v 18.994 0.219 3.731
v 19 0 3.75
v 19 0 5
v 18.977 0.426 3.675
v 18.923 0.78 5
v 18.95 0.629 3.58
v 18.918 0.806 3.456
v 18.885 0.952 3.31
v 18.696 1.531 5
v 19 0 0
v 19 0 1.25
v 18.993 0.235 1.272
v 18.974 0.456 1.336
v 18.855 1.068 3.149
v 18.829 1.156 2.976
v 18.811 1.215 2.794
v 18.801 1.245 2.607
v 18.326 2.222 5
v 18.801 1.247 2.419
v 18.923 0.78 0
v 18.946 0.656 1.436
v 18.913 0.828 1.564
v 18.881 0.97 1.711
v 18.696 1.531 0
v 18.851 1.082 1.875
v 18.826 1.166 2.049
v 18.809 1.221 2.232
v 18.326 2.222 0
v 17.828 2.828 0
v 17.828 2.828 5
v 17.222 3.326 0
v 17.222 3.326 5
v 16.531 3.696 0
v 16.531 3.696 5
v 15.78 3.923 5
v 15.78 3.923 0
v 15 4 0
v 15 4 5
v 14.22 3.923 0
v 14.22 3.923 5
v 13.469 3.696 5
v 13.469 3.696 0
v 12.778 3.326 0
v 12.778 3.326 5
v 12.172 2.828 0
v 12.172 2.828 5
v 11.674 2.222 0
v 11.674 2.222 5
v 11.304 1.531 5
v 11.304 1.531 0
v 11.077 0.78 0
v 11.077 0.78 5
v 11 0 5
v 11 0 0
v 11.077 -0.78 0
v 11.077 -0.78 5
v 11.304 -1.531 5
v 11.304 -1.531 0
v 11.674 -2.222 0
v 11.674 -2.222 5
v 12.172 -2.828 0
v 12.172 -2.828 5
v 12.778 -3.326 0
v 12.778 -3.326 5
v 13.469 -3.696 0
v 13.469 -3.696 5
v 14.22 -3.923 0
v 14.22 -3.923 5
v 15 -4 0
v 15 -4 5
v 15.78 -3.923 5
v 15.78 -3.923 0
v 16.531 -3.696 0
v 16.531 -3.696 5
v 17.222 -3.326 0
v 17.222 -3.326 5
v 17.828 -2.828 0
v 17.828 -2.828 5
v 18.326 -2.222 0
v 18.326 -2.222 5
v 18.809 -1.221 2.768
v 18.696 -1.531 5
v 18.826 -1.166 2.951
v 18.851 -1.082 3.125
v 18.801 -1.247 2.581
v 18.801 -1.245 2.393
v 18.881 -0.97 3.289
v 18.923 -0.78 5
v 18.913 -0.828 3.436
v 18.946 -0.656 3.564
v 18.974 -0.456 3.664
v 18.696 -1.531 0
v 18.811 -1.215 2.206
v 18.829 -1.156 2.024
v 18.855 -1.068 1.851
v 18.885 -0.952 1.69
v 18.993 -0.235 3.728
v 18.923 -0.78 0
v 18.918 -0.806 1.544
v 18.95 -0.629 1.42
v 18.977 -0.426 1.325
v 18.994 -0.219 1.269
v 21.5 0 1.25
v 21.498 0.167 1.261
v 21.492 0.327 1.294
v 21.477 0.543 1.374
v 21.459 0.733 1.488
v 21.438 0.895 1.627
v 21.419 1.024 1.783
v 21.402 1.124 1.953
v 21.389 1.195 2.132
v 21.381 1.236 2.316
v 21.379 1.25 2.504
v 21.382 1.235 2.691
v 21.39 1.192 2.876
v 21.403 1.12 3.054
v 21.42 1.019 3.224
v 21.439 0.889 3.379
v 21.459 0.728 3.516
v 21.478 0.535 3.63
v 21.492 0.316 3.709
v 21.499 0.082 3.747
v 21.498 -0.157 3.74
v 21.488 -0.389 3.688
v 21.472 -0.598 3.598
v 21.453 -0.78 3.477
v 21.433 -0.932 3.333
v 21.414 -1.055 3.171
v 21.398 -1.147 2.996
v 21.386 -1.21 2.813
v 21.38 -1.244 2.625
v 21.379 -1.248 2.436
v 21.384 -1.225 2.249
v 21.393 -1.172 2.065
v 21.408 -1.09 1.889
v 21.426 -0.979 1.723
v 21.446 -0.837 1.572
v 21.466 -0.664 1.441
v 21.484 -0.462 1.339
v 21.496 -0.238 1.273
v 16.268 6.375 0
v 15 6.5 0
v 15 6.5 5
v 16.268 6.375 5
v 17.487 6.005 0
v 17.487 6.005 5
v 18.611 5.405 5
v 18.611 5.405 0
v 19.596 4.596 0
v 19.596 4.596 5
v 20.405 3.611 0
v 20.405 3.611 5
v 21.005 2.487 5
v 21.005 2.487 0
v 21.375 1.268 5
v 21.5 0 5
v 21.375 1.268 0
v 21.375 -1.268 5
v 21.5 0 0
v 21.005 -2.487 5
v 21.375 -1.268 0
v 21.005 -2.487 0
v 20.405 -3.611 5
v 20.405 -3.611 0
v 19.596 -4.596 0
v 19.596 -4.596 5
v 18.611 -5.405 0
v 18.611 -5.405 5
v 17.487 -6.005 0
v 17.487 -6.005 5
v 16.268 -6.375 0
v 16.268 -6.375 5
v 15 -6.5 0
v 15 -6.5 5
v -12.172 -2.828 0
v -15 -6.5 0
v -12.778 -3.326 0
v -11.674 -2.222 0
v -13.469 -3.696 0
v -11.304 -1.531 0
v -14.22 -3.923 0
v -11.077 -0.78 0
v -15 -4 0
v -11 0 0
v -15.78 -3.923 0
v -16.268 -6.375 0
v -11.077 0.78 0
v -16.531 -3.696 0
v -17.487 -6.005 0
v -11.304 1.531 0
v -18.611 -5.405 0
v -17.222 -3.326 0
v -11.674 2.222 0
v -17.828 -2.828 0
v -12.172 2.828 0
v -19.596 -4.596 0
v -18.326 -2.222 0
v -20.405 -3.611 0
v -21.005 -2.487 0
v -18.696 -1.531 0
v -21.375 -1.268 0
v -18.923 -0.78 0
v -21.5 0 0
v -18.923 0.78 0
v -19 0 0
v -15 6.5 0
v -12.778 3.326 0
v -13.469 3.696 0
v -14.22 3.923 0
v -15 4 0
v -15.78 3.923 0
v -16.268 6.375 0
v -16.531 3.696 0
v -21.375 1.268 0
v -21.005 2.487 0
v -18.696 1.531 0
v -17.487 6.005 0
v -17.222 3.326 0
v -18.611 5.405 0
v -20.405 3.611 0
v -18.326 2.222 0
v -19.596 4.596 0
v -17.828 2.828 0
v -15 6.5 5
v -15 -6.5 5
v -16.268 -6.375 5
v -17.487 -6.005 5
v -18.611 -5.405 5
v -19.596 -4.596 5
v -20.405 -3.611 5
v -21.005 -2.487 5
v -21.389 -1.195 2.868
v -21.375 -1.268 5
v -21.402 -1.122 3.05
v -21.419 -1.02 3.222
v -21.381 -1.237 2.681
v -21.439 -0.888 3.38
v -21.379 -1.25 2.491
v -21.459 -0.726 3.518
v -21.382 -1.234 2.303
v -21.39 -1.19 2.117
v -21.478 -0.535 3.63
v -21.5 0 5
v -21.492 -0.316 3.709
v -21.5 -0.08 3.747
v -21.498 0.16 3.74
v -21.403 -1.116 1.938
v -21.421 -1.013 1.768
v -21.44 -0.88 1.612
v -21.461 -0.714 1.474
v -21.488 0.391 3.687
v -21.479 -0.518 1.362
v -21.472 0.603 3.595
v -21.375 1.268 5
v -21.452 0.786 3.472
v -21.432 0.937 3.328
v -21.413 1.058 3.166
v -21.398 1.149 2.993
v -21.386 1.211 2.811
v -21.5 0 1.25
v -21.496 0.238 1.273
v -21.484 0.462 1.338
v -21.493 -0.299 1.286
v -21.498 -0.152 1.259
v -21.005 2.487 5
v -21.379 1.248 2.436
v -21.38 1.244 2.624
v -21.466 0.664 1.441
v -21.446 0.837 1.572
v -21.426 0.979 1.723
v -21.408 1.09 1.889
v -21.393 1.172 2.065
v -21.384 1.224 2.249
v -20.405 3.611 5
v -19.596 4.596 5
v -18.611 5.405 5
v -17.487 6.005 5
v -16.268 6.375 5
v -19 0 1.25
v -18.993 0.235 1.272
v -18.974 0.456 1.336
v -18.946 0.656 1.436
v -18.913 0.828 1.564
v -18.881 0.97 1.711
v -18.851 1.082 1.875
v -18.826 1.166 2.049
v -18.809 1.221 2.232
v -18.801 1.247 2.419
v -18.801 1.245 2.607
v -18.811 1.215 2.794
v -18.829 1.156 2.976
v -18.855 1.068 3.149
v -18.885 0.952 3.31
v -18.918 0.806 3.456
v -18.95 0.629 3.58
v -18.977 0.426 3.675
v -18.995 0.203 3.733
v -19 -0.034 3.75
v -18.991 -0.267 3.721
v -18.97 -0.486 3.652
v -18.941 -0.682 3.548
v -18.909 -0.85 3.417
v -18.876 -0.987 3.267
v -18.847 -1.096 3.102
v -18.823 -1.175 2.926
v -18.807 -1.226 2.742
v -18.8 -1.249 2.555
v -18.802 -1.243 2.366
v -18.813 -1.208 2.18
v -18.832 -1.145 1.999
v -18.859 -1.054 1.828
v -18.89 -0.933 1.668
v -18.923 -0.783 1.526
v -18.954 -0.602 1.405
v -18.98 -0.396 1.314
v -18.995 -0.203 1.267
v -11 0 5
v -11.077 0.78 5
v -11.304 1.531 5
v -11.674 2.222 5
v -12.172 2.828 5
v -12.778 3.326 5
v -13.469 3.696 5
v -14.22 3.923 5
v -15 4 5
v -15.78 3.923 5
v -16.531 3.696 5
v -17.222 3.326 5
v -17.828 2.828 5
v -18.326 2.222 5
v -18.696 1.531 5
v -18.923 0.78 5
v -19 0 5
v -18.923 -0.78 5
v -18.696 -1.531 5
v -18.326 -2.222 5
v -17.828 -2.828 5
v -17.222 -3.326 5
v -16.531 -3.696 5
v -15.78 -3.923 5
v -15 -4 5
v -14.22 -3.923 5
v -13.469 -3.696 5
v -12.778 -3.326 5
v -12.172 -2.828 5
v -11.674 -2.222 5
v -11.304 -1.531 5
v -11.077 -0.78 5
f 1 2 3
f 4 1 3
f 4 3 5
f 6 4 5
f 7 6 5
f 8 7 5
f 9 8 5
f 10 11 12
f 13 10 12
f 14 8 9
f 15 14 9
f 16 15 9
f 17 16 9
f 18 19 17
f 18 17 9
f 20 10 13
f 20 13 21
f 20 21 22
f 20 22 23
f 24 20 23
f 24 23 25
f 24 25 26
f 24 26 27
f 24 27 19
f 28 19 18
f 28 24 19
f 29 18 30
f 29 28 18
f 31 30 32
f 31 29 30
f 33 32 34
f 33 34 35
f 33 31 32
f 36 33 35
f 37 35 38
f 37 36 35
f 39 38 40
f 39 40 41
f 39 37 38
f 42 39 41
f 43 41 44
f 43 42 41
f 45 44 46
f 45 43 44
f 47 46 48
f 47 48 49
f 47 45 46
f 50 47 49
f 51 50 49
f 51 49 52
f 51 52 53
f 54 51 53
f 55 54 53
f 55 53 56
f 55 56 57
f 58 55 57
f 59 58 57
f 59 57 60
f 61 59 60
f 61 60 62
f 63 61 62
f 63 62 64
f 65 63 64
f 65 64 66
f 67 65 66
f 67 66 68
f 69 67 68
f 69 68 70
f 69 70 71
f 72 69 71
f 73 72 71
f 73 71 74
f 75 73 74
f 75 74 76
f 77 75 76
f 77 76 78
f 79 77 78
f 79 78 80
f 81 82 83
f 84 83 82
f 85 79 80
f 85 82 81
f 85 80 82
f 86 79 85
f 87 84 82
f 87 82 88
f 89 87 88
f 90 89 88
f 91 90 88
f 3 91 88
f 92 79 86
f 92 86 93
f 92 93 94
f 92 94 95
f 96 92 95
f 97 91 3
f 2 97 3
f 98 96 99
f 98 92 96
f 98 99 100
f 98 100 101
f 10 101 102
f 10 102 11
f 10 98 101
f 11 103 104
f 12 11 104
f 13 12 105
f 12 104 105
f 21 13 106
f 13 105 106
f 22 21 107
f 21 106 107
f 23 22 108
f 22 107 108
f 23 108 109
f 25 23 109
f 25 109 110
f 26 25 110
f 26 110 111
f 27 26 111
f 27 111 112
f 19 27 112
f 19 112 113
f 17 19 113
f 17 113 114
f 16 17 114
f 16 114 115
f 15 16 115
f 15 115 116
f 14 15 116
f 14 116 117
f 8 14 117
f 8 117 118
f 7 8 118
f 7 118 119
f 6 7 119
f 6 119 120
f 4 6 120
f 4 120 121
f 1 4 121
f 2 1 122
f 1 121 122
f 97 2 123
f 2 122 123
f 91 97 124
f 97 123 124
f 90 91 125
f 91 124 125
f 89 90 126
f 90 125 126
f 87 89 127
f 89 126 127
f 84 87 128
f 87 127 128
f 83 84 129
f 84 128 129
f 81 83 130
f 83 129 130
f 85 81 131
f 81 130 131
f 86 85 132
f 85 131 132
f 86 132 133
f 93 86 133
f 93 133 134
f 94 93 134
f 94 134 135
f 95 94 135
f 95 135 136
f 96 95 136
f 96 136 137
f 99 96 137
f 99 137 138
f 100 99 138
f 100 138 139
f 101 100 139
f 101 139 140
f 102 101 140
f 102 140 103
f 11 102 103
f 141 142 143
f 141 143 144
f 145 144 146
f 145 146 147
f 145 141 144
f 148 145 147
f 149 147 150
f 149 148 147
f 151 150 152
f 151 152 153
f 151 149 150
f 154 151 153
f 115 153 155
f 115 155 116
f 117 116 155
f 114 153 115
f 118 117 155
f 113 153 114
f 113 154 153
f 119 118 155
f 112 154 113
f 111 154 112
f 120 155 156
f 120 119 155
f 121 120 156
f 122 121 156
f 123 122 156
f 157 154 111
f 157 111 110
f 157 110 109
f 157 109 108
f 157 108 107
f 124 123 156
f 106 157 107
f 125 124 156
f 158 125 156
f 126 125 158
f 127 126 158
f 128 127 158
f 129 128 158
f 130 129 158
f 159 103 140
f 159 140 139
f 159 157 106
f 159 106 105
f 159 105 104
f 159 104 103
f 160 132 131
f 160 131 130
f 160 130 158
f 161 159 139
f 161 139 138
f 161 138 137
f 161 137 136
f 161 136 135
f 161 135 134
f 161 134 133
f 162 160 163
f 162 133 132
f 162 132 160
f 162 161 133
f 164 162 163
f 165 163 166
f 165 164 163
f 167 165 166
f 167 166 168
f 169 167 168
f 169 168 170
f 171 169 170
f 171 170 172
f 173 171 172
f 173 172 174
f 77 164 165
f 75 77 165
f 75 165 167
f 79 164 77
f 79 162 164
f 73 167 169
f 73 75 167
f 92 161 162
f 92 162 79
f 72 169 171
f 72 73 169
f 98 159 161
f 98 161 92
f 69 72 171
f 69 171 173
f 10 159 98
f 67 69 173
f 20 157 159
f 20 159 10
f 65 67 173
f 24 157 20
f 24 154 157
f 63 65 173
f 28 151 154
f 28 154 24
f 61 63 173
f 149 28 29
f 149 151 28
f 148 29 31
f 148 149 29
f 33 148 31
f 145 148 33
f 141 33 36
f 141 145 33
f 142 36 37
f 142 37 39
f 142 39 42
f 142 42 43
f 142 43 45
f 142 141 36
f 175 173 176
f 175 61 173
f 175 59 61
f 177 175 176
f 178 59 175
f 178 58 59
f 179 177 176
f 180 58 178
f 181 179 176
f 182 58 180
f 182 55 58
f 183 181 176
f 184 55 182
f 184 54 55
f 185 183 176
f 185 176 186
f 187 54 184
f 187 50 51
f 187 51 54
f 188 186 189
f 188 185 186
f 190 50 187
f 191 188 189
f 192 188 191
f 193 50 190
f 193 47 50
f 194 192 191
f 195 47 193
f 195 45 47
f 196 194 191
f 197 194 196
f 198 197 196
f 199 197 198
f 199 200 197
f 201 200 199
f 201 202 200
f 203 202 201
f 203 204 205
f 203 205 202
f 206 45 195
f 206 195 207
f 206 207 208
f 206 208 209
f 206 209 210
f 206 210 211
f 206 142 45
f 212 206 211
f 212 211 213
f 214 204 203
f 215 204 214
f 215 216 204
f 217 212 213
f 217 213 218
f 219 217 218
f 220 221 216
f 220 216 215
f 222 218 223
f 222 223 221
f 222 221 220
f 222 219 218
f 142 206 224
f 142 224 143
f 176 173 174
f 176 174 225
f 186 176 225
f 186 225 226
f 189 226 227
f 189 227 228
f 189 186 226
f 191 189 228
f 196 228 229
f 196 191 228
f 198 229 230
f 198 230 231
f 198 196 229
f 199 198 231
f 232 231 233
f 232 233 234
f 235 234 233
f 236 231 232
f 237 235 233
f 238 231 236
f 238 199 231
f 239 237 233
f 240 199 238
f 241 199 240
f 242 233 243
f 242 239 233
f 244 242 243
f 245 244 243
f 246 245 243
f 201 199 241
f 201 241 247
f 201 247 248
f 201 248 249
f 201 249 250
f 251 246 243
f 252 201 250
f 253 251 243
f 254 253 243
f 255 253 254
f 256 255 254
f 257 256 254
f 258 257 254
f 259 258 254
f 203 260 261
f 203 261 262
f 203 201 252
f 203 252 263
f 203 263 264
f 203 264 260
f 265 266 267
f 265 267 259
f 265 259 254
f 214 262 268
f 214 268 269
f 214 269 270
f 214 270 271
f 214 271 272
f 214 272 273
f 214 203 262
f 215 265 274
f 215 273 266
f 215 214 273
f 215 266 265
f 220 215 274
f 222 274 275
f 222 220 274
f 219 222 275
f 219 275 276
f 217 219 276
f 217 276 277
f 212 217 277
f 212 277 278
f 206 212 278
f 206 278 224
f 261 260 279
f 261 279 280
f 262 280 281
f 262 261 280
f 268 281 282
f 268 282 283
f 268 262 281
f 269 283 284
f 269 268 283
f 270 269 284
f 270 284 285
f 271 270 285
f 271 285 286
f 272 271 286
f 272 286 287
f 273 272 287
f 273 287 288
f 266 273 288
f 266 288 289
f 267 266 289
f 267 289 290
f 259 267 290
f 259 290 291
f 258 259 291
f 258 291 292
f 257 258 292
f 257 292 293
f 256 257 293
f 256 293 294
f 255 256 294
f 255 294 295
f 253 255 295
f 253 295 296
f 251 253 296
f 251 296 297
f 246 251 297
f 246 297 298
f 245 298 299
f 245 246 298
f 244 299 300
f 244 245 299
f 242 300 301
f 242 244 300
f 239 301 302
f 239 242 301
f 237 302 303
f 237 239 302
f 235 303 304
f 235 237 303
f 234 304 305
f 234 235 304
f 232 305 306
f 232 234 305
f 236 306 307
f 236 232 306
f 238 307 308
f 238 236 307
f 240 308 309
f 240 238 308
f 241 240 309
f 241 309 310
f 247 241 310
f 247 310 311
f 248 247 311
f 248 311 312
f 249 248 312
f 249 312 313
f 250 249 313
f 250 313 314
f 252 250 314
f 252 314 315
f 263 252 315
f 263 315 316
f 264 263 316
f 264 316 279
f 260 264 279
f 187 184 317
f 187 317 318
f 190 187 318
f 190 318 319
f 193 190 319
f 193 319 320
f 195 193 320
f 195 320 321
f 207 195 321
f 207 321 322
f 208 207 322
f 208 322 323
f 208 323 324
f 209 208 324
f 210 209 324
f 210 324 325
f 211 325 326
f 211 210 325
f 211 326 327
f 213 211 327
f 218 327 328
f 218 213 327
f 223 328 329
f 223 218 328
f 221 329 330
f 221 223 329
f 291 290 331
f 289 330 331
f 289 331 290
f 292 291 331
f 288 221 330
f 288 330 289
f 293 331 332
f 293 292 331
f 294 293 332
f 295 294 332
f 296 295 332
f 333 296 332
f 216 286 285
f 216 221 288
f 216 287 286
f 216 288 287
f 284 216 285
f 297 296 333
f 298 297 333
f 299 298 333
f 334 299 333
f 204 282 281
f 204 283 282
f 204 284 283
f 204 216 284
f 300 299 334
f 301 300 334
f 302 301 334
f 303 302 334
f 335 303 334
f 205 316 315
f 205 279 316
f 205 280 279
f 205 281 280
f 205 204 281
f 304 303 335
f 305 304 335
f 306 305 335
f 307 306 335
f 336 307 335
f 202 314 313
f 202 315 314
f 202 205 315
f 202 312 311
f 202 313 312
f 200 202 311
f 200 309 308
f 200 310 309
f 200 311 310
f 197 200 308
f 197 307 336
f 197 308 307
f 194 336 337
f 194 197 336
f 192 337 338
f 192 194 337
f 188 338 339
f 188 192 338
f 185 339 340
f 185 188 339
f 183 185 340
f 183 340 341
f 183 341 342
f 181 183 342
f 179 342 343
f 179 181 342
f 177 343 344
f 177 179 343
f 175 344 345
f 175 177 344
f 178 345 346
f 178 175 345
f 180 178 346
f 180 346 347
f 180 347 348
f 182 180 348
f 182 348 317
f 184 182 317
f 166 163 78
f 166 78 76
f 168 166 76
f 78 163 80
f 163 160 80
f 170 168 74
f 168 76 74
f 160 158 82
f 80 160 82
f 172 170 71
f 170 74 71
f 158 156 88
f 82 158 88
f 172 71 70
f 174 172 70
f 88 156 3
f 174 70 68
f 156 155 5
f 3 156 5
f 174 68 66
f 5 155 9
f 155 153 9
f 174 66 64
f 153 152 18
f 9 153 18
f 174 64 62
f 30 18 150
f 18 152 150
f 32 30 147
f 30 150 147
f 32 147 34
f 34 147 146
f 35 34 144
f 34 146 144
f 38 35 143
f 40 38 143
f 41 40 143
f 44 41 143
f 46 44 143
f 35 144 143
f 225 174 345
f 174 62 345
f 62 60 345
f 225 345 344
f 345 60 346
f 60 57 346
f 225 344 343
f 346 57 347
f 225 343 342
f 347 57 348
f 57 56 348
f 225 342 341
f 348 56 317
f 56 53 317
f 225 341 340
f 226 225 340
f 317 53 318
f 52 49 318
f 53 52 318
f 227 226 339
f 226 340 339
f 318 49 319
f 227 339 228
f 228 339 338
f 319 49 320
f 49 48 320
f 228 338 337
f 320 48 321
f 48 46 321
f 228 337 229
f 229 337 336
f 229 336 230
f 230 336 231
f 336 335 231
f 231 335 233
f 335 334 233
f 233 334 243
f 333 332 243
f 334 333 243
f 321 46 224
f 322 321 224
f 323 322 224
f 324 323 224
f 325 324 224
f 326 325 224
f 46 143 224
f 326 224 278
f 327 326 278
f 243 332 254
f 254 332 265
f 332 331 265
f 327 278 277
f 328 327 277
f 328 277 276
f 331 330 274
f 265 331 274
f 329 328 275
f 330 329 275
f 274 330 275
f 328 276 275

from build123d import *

# Parameters (mm, degrees)
SKETCH1_R           = 4
BOSS_EXTRUDE1_DEPTH = 5
CUT_EXTRUDE1_DEPTH  = 5


with BuildPart() as part:
    # Sketch1 → Boss-Extrude1 (new body)
    with BuildSketch(Plane.XY):
        with BuildLine():
            Line((-15, 6.5), (15, 6.5))
            ThreePointArc((15, 6.5), (21.5, 0), (15, -6.5))
            Line((15, -6.5), (-15, -6.5))
            ThreePointArc((-15, -6.5), (-21.5, 0), (-15, 6.5))
        make_face()
        with Locations((-15, 0)):
            Circle(SKETCH1_R, mode=Mode.SUBTRACT)
        with Locations((15, 0)):
            Circle(SKETCH1_R, mode=Mode.SUBTRACT)
    extrude(amount=BOSS_EXTRUDE1_DEPTH)

    # Sketch2 → Cut-Extrude1 (cut)
    with BuildSketch(Plane(origin=(21.5, 0, 0), x_dir=(0, 0, -1), z_dir=(1, 0, 0))):
        with BuildLine():
            ThreePointArc((-3.75, 0), (-2.5, -1.25), (-1.25, 0))
            Line((-1.25, 0), (-3.75, 0))
        make_face()
        with BuildLine():
            Line((-3.75, 0), (-1.25, 0))
            ThreePointArc((-1.25, 0), (-2.5, 1.25), (-3.75, 0))
        make_face()
    cut_extrude1 = extrude(amount=-CUT_EXTRUDE1_DEPTH, mode=Mode.SUBTRACT)

    # Mirror1: Cut-Extrude1 across plane
    add(cut_extrude1.mirror(Plane(origin=(0, 0, 0), x_dir=(0, 0, 1), z_dir=(1, 0, 0))), mode=Mode.SUBTRACT)


solid = part.part
